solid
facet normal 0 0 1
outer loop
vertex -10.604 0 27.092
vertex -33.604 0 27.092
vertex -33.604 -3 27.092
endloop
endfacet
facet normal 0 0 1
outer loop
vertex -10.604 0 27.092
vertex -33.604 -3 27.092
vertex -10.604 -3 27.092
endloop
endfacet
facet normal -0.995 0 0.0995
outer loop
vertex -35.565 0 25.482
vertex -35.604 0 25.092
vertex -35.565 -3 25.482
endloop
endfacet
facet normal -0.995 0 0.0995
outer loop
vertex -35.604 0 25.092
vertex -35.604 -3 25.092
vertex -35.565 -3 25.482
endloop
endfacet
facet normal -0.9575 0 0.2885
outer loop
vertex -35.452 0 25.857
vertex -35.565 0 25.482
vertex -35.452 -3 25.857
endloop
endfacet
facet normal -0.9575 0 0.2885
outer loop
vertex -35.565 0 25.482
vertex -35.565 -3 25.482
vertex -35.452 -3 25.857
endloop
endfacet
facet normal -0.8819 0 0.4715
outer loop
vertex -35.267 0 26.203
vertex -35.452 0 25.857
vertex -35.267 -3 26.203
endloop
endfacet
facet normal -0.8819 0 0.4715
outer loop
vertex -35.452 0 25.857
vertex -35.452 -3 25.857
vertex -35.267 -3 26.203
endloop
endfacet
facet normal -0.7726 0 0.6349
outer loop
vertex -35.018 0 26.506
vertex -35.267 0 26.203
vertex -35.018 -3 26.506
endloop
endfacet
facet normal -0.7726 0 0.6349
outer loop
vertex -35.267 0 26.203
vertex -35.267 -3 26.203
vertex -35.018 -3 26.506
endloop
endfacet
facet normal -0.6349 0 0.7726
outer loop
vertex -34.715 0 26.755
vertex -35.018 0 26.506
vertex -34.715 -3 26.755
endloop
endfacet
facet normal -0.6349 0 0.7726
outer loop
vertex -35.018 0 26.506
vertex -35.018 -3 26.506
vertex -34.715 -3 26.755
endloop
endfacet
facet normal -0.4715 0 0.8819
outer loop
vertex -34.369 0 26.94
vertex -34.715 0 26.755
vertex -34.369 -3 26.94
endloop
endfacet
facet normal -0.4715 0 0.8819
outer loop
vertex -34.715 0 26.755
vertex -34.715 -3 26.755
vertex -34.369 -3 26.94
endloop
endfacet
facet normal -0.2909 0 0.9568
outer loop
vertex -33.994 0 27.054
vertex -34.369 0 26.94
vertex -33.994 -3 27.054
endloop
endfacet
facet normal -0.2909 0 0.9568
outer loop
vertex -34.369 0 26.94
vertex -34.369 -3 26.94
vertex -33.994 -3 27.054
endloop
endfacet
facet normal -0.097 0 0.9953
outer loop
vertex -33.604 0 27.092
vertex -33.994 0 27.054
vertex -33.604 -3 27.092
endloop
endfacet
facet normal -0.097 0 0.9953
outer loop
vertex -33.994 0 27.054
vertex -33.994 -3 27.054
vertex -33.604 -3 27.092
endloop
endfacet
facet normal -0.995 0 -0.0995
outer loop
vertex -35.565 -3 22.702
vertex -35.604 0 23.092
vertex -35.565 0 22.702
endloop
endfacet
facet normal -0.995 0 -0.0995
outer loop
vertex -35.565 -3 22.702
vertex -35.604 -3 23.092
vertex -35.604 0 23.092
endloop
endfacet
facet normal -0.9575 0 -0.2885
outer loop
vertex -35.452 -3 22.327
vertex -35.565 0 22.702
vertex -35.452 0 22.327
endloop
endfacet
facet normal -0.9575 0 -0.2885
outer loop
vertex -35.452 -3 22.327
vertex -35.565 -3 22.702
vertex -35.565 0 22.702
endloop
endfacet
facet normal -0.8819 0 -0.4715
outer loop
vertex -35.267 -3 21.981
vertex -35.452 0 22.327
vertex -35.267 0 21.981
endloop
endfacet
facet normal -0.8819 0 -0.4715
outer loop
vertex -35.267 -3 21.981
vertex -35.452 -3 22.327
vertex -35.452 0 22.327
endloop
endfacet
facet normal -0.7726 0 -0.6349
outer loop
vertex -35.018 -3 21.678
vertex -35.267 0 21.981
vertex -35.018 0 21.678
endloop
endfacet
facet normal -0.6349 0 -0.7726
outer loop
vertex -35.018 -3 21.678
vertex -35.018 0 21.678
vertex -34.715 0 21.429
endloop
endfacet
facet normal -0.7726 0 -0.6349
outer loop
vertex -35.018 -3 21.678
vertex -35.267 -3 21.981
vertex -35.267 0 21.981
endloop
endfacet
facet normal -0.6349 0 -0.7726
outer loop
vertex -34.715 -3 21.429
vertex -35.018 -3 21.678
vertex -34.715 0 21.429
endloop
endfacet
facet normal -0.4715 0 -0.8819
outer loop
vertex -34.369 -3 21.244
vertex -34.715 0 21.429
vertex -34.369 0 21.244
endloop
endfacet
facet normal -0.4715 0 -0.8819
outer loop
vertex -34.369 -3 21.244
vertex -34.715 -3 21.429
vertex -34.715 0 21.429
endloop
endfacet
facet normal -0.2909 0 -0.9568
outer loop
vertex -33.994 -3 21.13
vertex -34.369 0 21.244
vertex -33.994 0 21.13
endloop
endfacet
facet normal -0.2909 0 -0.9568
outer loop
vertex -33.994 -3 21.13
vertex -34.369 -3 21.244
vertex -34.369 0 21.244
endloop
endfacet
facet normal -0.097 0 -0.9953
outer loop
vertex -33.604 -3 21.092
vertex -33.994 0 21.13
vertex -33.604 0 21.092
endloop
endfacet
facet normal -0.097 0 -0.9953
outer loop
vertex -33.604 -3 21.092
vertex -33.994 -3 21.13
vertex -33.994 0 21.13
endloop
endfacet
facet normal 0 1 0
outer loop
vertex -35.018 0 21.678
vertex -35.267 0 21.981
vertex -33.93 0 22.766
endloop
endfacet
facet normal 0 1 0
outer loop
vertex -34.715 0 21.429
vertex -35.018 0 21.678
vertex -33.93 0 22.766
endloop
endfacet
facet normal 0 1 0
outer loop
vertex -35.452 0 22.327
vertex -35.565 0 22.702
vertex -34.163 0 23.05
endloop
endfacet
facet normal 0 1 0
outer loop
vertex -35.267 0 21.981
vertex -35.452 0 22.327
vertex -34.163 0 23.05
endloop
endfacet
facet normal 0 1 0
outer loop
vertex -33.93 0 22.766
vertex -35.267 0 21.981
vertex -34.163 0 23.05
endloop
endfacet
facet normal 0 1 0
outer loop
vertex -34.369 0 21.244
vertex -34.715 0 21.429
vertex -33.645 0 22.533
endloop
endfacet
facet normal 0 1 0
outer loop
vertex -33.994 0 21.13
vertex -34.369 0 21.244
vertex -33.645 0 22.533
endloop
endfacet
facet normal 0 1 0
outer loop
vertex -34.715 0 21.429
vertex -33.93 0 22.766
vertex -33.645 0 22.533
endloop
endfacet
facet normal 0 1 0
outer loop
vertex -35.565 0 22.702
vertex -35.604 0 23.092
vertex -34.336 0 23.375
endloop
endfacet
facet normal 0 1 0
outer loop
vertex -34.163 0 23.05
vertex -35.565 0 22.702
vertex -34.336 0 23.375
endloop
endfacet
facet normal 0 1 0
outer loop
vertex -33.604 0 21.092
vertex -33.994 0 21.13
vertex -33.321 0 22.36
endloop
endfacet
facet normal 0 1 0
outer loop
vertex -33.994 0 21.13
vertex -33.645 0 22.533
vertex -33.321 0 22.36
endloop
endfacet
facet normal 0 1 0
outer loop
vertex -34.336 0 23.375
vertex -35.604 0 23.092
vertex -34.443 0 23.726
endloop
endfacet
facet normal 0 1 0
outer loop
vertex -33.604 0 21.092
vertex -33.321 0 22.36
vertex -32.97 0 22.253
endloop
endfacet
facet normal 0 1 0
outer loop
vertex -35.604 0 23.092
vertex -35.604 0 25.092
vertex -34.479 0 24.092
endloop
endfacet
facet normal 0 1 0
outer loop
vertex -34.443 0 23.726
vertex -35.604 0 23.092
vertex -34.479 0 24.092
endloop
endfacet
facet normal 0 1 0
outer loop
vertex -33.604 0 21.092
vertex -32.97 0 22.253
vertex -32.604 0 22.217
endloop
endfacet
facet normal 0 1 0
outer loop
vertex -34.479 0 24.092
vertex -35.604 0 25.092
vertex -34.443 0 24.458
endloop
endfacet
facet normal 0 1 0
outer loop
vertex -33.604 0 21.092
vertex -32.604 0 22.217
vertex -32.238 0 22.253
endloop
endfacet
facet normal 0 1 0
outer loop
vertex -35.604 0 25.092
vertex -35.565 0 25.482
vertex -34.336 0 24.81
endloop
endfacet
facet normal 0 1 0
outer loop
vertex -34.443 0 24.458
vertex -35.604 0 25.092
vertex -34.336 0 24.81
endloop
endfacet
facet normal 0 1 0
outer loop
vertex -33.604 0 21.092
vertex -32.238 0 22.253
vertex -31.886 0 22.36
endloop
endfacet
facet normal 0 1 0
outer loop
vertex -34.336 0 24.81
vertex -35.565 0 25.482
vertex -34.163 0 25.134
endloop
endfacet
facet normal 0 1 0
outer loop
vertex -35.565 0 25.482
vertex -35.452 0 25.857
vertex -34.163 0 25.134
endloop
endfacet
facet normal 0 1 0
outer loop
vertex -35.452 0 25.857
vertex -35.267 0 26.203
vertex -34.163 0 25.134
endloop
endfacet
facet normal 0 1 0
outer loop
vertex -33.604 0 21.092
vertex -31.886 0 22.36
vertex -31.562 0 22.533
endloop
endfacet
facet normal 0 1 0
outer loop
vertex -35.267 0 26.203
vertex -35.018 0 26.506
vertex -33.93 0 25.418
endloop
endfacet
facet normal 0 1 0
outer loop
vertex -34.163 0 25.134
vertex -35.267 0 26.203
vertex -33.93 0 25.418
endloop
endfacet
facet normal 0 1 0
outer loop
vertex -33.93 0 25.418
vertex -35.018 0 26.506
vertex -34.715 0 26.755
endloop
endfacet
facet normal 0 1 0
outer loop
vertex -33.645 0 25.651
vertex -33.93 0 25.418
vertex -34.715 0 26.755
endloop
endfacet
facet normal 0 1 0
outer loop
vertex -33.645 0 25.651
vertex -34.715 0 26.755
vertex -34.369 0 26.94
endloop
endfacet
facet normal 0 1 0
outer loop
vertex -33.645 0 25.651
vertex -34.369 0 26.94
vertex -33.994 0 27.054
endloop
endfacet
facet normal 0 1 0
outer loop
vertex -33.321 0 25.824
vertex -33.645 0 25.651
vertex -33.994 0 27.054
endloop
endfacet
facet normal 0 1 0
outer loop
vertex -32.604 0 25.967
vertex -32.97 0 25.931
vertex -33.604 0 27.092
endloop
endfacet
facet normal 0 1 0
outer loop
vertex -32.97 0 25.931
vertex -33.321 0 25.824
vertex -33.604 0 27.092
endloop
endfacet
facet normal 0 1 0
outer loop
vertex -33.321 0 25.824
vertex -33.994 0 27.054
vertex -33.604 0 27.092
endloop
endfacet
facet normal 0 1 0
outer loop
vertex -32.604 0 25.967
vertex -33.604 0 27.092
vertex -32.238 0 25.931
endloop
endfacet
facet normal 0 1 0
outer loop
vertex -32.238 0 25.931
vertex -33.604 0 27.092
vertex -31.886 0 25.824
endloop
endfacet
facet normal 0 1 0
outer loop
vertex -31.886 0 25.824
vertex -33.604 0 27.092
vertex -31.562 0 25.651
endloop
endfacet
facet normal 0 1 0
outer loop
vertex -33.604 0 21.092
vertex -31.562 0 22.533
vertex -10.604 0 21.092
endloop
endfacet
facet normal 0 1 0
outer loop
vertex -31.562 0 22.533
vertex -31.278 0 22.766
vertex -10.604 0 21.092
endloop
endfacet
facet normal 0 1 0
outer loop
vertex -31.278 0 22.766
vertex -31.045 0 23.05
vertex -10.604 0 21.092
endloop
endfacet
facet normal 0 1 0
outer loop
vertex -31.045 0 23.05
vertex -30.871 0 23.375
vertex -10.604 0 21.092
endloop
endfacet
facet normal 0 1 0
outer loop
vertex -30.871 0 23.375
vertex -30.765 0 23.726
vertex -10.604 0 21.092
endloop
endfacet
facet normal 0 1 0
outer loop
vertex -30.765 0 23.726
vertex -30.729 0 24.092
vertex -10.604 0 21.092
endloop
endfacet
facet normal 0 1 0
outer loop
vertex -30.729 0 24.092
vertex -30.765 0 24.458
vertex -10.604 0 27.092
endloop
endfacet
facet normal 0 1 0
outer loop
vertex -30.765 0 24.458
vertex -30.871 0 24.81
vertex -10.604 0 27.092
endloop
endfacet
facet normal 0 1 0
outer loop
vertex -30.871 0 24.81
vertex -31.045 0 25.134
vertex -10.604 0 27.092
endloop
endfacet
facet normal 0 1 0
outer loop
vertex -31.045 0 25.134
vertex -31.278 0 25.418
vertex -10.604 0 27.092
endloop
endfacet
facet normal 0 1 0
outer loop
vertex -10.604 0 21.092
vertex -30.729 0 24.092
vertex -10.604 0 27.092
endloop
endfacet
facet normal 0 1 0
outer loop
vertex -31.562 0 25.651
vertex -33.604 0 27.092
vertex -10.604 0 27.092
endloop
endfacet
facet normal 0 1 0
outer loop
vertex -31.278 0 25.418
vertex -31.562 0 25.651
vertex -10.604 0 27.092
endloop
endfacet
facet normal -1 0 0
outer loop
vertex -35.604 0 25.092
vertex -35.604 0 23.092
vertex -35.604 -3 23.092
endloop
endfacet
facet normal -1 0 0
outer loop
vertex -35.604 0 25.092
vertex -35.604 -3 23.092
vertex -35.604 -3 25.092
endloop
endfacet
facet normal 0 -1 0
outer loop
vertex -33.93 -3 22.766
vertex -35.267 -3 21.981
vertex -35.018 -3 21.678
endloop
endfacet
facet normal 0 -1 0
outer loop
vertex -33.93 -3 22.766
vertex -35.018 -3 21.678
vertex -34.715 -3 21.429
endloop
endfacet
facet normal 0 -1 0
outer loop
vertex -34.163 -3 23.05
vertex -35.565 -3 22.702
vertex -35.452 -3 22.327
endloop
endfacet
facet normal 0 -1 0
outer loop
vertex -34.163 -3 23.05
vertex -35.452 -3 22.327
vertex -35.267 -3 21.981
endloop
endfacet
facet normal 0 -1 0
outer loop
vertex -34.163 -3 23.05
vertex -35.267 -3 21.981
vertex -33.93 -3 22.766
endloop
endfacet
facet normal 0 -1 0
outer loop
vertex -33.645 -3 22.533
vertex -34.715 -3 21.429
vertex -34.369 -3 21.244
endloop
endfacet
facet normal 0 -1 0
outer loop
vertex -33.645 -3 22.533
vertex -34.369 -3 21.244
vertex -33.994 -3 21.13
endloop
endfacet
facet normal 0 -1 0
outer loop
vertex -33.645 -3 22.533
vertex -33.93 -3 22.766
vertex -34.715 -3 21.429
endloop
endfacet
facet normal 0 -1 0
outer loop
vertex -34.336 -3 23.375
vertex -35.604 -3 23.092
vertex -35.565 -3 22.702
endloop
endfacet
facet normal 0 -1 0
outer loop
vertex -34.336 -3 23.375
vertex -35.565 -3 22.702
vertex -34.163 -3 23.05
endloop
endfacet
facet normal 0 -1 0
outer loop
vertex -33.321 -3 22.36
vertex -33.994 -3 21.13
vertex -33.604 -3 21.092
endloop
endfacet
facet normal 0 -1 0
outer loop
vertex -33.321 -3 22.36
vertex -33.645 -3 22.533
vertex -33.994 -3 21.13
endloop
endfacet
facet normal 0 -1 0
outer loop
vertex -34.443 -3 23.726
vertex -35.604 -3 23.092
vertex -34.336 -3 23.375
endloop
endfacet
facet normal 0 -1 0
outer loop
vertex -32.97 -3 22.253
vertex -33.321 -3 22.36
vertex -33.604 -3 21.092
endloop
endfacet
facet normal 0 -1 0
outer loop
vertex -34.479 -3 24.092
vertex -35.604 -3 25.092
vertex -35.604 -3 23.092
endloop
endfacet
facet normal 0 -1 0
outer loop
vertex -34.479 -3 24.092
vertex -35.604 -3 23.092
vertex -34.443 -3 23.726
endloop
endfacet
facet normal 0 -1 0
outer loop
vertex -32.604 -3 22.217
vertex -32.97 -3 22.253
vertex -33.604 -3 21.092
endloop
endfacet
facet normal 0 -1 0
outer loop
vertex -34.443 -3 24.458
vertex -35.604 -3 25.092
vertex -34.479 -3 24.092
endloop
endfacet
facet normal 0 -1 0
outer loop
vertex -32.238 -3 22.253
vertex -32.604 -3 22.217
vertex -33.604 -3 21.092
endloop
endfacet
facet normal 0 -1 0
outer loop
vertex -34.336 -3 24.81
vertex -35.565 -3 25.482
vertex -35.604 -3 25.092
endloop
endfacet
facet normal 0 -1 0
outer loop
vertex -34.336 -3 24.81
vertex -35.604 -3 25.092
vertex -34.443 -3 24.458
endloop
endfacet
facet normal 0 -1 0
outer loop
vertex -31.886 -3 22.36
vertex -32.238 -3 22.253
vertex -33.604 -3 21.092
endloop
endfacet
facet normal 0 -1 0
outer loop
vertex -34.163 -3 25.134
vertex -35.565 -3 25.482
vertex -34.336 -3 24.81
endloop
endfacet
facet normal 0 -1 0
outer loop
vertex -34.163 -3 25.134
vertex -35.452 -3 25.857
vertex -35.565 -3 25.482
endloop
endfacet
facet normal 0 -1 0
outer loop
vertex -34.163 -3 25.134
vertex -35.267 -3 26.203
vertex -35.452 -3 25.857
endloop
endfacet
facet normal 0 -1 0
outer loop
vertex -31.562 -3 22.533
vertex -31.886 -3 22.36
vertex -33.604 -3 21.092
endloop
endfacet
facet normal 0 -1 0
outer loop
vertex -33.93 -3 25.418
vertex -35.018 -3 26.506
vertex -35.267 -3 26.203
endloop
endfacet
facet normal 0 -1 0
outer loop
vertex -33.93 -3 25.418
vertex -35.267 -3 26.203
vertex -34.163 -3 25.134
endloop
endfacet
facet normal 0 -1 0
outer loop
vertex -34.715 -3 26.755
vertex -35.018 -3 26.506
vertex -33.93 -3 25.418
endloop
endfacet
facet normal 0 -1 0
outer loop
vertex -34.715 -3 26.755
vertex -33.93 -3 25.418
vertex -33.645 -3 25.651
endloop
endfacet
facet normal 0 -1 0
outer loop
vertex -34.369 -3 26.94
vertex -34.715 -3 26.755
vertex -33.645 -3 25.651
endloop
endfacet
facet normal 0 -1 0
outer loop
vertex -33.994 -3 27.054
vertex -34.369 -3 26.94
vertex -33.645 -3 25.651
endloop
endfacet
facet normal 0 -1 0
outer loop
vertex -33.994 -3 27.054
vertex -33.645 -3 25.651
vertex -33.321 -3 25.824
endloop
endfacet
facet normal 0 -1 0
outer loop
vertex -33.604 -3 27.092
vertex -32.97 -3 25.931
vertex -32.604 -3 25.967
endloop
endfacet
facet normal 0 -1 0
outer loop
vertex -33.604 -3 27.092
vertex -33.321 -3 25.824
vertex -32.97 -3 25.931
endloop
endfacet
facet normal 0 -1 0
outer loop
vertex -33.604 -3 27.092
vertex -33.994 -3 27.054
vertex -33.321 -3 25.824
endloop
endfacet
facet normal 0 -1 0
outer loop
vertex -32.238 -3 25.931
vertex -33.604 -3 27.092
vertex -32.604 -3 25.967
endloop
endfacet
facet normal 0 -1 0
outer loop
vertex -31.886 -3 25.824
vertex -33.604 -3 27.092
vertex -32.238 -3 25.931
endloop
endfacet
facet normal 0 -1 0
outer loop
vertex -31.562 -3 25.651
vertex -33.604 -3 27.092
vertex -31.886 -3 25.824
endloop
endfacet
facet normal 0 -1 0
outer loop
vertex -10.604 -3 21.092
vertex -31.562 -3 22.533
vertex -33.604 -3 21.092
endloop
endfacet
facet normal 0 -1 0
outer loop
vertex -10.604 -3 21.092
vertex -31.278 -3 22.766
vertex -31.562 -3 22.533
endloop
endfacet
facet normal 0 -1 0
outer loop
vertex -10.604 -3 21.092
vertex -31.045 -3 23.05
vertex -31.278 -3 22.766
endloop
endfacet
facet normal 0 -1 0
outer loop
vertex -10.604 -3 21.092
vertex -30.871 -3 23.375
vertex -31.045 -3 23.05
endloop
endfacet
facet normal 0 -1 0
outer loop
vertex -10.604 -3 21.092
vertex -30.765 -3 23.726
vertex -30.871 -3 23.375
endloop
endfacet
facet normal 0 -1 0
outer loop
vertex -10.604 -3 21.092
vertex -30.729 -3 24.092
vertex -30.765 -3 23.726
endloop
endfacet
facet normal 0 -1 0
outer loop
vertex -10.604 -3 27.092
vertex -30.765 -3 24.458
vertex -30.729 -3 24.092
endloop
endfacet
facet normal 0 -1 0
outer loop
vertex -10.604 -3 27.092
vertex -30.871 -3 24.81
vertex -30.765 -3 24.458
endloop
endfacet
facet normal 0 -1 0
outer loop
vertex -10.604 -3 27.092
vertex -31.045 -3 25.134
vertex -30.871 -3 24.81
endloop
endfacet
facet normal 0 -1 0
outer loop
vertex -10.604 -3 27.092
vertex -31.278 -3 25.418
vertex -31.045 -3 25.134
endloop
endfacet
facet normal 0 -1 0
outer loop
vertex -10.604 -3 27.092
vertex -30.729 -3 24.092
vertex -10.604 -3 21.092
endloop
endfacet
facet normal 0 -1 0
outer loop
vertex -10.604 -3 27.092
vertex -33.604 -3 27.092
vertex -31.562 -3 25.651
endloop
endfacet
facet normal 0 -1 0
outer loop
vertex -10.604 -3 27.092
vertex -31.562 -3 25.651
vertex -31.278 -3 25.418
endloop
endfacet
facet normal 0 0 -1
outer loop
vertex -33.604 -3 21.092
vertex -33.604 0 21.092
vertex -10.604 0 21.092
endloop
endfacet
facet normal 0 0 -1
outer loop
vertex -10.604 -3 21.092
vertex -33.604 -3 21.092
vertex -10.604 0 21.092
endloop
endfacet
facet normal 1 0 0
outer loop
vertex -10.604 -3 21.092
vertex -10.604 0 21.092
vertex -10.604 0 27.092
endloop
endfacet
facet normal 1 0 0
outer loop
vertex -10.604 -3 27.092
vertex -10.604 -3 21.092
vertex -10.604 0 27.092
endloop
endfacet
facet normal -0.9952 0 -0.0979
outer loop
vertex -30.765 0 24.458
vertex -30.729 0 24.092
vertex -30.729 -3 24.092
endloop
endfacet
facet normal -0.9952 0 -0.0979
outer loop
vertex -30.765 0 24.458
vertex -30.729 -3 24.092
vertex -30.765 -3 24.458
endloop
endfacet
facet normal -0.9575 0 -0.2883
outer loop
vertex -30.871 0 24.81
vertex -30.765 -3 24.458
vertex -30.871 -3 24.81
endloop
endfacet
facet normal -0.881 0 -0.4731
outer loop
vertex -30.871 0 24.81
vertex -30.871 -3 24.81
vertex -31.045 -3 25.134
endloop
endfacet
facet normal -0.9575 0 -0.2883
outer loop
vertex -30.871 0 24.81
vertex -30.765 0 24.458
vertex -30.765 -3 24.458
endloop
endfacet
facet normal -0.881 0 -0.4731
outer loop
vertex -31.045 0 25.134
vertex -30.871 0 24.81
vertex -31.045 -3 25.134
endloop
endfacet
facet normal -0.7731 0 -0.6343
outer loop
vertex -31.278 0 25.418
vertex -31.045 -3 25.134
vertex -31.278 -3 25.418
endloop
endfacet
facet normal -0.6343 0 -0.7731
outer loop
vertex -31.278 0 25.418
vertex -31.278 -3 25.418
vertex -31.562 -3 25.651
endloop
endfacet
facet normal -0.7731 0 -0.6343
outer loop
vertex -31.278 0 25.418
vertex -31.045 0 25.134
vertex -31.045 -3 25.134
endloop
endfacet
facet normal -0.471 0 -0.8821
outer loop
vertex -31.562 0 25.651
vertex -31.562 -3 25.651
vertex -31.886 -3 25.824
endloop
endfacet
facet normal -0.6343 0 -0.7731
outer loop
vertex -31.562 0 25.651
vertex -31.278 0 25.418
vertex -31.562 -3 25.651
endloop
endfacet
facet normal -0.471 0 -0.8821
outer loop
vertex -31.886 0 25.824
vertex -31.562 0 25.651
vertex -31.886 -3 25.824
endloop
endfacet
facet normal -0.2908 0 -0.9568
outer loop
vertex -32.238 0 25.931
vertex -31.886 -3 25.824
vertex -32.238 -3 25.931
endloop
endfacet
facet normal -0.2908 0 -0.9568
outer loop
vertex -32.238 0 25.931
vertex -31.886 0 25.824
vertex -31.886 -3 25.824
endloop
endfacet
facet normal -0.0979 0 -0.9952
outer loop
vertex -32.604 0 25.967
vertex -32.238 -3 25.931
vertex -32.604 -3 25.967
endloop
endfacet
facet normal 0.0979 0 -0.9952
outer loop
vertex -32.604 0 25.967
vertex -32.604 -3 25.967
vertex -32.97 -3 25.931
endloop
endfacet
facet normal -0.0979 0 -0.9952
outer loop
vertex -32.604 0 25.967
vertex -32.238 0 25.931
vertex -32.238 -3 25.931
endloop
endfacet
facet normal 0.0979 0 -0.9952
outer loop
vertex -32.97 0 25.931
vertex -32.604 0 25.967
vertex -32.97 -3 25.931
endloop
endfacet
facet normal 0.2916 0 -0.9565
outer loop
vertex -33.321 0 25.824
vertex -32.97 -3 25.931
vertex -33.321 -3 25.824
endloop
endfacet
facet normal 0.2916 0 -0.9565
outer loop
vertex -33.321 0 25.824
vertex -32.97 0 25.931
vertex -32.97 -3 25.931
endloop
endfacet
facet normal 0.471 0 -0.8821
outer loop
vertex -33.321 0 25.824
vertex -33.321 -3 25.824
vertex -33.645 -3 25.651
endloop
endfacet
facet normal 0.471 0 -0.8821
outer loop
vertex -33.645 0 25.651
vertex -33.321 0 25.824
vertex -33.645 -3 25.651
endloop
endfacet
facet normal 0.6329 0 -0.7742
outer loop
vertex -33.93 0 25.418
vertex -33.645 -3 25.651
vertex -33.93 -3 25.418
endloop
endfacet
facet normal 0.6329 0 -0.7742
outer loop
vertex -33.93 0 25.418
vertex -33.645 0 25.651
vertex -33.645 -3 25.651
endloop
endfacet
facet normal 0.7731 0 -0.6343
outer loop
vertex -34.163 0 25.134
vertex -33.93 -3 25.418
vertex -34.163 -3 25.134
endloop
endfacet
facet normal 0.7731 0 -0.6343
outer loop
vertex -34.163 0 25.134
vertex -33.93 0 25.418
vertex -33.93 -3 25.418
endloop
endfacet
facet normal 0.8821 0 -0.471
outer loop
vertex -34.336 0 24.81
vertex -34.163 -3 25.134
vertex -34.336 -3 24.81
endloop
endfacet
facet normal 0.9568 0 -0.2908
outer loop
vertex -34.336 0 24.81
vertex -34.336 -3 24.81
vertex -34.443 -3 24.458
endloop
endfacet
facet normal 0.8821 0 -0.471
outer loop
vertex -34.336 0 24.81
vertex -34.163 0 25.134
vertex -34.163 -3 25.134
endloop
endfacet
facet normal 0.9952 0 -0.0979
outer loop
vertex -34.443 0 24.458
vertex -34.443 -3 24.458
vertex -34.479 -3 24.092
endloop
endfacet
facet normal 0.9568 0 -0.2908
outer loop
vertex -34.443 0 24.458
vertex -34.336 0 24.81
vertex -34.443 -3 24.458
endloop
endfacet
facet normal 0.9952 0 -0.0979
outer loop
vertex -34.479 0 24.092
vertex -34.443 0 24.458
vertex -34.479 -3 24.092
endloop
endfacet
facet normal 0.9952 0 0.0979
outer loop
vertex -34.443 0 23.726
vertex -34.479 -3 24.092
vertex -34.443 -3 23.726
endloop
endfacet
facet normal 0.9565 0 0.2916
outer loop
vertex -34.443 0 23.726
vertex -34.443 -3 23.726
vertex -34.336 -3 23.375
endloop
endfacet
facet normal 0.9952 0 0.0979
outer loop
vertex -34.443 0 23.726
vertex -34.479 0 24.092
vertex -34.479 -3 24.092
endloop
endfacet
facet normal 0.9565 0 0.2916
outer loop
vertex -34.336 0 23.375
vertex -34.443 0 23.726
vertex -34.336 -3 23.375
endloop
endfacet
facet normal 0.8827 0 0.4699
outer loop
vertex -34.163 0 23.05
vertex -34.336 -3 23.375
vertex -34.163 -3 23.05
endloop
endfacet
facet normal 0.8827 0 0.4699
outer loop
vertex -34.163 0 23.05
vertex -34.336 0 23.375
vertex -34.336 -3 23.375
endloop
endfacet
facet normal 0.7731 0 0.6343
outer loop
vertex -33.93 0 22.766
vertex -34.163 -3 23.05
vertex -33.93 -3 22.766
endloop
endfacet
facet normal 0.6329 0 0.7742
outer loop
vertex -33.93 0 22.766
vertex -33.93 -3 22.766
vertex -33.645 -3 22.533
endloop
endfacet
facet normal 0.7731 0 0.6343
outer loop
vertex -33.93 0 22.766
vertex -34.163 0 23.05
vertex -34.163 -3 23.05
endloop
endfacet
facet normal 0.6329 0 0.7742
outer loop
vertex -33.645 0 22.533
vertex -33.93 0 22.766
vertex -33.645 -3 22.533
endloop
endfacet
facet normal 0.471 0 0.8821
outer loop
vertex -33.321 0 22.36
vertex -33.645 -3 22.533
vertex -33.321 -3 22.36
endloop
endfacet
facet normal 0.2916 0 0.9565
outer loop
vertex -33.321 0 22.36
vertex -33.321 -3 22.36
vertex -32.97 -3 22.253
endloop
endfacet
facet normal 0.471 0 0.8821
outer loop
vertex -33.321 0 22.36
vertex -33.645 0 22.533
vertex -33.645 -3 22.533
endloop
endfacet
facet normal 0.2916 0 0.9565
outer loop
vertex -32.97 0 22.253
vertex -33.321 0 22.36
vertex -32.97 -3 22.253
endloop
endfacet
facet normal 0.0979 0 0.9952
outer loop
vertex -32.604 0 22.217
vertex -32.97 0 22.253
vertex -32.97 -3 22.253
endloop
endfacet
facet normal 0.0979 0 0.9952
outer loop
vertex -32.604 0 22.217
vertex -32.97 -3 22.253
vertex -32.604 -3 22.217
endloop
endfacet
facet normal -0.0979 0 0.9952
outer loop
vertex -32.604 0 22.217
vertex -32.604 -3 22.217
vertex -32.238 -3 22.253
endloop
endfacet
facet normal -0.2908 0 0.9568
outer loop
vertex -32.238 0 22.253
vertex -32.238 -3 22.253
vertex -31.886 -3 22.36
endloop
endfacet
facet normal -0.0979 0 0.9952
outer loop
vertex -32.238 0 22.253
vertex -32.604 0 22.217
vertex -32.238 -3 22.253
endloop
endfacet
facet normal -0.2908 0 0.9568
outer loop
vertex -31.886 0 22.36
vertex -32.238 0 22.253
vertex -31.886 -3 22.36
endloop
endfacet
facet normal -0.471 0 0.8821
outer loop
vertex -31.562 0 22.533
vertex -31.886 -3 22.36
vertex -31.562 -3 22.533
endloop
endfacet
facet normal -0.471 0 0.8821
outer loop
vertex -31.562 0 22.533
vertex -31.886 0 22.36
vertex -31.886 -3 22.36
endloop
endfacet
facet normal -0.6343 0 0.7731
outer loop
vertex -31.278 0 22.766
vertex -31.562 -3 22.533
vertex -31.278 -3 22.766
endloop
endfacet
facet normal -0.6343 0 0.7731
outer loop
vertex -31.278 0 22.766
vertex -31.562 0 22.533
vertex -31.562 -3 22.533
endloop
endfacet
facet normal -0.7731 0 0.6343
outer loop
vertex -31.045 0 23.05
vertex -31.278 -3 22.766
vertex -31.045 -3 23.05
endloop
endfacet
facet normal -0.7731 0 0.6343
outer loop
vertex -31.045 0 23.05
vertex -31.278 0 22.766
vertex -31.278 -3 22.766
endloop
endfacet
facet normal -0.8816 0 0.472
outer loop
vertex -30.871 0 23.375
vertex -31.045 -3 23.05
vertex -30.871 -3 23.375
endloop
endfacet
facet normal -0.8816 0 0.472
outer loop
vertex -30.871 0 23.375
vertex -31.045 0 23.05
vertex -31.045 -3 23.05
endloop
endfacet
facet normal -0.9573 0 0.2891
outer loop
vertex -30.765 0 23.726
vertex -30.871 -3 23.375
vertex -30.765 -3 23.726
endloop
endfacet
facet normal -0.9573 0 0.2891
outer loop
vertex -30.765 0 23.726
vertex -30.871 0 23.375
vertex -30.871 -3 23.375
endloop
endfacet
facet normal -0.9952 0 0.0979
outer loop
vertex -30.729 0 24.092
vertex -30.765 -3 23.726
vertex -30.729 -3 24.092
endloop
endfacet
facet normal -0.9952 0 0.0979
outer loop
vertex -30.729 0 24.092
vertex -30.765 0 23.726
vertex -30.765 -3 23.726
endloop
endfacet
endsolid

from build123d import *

# Parameters (mm, degrees)
F0_W     = 25
F0_H     = 6
F0_R     = 1.875
F1_DEPTH = 3
F2_R     = 2


with BuildPart() as f1:
    # F0 (on Front) → F1 (new body)
    with BuildSketch(Plane.XZ):
        with Locations((-23.103761, 24.092039)):
            Rectangle(F0_W, F0_H)
        with Locations((-32.603761, 24.092039)):
            Circle(F0_R, mode=Mode.SUBTRACT)
    extrude(amount=F1_DEPTH)

    # F2
    f2_edges = [f1.edges().sort_by_distance(p)[0] for p in [
        (-35.603761, -1.5, 27.092039),
        (-35.603761, -1.5, 21.092039),
    ]]
    fillet(f2_edges, radius=F2_R)


solid = f1.part
